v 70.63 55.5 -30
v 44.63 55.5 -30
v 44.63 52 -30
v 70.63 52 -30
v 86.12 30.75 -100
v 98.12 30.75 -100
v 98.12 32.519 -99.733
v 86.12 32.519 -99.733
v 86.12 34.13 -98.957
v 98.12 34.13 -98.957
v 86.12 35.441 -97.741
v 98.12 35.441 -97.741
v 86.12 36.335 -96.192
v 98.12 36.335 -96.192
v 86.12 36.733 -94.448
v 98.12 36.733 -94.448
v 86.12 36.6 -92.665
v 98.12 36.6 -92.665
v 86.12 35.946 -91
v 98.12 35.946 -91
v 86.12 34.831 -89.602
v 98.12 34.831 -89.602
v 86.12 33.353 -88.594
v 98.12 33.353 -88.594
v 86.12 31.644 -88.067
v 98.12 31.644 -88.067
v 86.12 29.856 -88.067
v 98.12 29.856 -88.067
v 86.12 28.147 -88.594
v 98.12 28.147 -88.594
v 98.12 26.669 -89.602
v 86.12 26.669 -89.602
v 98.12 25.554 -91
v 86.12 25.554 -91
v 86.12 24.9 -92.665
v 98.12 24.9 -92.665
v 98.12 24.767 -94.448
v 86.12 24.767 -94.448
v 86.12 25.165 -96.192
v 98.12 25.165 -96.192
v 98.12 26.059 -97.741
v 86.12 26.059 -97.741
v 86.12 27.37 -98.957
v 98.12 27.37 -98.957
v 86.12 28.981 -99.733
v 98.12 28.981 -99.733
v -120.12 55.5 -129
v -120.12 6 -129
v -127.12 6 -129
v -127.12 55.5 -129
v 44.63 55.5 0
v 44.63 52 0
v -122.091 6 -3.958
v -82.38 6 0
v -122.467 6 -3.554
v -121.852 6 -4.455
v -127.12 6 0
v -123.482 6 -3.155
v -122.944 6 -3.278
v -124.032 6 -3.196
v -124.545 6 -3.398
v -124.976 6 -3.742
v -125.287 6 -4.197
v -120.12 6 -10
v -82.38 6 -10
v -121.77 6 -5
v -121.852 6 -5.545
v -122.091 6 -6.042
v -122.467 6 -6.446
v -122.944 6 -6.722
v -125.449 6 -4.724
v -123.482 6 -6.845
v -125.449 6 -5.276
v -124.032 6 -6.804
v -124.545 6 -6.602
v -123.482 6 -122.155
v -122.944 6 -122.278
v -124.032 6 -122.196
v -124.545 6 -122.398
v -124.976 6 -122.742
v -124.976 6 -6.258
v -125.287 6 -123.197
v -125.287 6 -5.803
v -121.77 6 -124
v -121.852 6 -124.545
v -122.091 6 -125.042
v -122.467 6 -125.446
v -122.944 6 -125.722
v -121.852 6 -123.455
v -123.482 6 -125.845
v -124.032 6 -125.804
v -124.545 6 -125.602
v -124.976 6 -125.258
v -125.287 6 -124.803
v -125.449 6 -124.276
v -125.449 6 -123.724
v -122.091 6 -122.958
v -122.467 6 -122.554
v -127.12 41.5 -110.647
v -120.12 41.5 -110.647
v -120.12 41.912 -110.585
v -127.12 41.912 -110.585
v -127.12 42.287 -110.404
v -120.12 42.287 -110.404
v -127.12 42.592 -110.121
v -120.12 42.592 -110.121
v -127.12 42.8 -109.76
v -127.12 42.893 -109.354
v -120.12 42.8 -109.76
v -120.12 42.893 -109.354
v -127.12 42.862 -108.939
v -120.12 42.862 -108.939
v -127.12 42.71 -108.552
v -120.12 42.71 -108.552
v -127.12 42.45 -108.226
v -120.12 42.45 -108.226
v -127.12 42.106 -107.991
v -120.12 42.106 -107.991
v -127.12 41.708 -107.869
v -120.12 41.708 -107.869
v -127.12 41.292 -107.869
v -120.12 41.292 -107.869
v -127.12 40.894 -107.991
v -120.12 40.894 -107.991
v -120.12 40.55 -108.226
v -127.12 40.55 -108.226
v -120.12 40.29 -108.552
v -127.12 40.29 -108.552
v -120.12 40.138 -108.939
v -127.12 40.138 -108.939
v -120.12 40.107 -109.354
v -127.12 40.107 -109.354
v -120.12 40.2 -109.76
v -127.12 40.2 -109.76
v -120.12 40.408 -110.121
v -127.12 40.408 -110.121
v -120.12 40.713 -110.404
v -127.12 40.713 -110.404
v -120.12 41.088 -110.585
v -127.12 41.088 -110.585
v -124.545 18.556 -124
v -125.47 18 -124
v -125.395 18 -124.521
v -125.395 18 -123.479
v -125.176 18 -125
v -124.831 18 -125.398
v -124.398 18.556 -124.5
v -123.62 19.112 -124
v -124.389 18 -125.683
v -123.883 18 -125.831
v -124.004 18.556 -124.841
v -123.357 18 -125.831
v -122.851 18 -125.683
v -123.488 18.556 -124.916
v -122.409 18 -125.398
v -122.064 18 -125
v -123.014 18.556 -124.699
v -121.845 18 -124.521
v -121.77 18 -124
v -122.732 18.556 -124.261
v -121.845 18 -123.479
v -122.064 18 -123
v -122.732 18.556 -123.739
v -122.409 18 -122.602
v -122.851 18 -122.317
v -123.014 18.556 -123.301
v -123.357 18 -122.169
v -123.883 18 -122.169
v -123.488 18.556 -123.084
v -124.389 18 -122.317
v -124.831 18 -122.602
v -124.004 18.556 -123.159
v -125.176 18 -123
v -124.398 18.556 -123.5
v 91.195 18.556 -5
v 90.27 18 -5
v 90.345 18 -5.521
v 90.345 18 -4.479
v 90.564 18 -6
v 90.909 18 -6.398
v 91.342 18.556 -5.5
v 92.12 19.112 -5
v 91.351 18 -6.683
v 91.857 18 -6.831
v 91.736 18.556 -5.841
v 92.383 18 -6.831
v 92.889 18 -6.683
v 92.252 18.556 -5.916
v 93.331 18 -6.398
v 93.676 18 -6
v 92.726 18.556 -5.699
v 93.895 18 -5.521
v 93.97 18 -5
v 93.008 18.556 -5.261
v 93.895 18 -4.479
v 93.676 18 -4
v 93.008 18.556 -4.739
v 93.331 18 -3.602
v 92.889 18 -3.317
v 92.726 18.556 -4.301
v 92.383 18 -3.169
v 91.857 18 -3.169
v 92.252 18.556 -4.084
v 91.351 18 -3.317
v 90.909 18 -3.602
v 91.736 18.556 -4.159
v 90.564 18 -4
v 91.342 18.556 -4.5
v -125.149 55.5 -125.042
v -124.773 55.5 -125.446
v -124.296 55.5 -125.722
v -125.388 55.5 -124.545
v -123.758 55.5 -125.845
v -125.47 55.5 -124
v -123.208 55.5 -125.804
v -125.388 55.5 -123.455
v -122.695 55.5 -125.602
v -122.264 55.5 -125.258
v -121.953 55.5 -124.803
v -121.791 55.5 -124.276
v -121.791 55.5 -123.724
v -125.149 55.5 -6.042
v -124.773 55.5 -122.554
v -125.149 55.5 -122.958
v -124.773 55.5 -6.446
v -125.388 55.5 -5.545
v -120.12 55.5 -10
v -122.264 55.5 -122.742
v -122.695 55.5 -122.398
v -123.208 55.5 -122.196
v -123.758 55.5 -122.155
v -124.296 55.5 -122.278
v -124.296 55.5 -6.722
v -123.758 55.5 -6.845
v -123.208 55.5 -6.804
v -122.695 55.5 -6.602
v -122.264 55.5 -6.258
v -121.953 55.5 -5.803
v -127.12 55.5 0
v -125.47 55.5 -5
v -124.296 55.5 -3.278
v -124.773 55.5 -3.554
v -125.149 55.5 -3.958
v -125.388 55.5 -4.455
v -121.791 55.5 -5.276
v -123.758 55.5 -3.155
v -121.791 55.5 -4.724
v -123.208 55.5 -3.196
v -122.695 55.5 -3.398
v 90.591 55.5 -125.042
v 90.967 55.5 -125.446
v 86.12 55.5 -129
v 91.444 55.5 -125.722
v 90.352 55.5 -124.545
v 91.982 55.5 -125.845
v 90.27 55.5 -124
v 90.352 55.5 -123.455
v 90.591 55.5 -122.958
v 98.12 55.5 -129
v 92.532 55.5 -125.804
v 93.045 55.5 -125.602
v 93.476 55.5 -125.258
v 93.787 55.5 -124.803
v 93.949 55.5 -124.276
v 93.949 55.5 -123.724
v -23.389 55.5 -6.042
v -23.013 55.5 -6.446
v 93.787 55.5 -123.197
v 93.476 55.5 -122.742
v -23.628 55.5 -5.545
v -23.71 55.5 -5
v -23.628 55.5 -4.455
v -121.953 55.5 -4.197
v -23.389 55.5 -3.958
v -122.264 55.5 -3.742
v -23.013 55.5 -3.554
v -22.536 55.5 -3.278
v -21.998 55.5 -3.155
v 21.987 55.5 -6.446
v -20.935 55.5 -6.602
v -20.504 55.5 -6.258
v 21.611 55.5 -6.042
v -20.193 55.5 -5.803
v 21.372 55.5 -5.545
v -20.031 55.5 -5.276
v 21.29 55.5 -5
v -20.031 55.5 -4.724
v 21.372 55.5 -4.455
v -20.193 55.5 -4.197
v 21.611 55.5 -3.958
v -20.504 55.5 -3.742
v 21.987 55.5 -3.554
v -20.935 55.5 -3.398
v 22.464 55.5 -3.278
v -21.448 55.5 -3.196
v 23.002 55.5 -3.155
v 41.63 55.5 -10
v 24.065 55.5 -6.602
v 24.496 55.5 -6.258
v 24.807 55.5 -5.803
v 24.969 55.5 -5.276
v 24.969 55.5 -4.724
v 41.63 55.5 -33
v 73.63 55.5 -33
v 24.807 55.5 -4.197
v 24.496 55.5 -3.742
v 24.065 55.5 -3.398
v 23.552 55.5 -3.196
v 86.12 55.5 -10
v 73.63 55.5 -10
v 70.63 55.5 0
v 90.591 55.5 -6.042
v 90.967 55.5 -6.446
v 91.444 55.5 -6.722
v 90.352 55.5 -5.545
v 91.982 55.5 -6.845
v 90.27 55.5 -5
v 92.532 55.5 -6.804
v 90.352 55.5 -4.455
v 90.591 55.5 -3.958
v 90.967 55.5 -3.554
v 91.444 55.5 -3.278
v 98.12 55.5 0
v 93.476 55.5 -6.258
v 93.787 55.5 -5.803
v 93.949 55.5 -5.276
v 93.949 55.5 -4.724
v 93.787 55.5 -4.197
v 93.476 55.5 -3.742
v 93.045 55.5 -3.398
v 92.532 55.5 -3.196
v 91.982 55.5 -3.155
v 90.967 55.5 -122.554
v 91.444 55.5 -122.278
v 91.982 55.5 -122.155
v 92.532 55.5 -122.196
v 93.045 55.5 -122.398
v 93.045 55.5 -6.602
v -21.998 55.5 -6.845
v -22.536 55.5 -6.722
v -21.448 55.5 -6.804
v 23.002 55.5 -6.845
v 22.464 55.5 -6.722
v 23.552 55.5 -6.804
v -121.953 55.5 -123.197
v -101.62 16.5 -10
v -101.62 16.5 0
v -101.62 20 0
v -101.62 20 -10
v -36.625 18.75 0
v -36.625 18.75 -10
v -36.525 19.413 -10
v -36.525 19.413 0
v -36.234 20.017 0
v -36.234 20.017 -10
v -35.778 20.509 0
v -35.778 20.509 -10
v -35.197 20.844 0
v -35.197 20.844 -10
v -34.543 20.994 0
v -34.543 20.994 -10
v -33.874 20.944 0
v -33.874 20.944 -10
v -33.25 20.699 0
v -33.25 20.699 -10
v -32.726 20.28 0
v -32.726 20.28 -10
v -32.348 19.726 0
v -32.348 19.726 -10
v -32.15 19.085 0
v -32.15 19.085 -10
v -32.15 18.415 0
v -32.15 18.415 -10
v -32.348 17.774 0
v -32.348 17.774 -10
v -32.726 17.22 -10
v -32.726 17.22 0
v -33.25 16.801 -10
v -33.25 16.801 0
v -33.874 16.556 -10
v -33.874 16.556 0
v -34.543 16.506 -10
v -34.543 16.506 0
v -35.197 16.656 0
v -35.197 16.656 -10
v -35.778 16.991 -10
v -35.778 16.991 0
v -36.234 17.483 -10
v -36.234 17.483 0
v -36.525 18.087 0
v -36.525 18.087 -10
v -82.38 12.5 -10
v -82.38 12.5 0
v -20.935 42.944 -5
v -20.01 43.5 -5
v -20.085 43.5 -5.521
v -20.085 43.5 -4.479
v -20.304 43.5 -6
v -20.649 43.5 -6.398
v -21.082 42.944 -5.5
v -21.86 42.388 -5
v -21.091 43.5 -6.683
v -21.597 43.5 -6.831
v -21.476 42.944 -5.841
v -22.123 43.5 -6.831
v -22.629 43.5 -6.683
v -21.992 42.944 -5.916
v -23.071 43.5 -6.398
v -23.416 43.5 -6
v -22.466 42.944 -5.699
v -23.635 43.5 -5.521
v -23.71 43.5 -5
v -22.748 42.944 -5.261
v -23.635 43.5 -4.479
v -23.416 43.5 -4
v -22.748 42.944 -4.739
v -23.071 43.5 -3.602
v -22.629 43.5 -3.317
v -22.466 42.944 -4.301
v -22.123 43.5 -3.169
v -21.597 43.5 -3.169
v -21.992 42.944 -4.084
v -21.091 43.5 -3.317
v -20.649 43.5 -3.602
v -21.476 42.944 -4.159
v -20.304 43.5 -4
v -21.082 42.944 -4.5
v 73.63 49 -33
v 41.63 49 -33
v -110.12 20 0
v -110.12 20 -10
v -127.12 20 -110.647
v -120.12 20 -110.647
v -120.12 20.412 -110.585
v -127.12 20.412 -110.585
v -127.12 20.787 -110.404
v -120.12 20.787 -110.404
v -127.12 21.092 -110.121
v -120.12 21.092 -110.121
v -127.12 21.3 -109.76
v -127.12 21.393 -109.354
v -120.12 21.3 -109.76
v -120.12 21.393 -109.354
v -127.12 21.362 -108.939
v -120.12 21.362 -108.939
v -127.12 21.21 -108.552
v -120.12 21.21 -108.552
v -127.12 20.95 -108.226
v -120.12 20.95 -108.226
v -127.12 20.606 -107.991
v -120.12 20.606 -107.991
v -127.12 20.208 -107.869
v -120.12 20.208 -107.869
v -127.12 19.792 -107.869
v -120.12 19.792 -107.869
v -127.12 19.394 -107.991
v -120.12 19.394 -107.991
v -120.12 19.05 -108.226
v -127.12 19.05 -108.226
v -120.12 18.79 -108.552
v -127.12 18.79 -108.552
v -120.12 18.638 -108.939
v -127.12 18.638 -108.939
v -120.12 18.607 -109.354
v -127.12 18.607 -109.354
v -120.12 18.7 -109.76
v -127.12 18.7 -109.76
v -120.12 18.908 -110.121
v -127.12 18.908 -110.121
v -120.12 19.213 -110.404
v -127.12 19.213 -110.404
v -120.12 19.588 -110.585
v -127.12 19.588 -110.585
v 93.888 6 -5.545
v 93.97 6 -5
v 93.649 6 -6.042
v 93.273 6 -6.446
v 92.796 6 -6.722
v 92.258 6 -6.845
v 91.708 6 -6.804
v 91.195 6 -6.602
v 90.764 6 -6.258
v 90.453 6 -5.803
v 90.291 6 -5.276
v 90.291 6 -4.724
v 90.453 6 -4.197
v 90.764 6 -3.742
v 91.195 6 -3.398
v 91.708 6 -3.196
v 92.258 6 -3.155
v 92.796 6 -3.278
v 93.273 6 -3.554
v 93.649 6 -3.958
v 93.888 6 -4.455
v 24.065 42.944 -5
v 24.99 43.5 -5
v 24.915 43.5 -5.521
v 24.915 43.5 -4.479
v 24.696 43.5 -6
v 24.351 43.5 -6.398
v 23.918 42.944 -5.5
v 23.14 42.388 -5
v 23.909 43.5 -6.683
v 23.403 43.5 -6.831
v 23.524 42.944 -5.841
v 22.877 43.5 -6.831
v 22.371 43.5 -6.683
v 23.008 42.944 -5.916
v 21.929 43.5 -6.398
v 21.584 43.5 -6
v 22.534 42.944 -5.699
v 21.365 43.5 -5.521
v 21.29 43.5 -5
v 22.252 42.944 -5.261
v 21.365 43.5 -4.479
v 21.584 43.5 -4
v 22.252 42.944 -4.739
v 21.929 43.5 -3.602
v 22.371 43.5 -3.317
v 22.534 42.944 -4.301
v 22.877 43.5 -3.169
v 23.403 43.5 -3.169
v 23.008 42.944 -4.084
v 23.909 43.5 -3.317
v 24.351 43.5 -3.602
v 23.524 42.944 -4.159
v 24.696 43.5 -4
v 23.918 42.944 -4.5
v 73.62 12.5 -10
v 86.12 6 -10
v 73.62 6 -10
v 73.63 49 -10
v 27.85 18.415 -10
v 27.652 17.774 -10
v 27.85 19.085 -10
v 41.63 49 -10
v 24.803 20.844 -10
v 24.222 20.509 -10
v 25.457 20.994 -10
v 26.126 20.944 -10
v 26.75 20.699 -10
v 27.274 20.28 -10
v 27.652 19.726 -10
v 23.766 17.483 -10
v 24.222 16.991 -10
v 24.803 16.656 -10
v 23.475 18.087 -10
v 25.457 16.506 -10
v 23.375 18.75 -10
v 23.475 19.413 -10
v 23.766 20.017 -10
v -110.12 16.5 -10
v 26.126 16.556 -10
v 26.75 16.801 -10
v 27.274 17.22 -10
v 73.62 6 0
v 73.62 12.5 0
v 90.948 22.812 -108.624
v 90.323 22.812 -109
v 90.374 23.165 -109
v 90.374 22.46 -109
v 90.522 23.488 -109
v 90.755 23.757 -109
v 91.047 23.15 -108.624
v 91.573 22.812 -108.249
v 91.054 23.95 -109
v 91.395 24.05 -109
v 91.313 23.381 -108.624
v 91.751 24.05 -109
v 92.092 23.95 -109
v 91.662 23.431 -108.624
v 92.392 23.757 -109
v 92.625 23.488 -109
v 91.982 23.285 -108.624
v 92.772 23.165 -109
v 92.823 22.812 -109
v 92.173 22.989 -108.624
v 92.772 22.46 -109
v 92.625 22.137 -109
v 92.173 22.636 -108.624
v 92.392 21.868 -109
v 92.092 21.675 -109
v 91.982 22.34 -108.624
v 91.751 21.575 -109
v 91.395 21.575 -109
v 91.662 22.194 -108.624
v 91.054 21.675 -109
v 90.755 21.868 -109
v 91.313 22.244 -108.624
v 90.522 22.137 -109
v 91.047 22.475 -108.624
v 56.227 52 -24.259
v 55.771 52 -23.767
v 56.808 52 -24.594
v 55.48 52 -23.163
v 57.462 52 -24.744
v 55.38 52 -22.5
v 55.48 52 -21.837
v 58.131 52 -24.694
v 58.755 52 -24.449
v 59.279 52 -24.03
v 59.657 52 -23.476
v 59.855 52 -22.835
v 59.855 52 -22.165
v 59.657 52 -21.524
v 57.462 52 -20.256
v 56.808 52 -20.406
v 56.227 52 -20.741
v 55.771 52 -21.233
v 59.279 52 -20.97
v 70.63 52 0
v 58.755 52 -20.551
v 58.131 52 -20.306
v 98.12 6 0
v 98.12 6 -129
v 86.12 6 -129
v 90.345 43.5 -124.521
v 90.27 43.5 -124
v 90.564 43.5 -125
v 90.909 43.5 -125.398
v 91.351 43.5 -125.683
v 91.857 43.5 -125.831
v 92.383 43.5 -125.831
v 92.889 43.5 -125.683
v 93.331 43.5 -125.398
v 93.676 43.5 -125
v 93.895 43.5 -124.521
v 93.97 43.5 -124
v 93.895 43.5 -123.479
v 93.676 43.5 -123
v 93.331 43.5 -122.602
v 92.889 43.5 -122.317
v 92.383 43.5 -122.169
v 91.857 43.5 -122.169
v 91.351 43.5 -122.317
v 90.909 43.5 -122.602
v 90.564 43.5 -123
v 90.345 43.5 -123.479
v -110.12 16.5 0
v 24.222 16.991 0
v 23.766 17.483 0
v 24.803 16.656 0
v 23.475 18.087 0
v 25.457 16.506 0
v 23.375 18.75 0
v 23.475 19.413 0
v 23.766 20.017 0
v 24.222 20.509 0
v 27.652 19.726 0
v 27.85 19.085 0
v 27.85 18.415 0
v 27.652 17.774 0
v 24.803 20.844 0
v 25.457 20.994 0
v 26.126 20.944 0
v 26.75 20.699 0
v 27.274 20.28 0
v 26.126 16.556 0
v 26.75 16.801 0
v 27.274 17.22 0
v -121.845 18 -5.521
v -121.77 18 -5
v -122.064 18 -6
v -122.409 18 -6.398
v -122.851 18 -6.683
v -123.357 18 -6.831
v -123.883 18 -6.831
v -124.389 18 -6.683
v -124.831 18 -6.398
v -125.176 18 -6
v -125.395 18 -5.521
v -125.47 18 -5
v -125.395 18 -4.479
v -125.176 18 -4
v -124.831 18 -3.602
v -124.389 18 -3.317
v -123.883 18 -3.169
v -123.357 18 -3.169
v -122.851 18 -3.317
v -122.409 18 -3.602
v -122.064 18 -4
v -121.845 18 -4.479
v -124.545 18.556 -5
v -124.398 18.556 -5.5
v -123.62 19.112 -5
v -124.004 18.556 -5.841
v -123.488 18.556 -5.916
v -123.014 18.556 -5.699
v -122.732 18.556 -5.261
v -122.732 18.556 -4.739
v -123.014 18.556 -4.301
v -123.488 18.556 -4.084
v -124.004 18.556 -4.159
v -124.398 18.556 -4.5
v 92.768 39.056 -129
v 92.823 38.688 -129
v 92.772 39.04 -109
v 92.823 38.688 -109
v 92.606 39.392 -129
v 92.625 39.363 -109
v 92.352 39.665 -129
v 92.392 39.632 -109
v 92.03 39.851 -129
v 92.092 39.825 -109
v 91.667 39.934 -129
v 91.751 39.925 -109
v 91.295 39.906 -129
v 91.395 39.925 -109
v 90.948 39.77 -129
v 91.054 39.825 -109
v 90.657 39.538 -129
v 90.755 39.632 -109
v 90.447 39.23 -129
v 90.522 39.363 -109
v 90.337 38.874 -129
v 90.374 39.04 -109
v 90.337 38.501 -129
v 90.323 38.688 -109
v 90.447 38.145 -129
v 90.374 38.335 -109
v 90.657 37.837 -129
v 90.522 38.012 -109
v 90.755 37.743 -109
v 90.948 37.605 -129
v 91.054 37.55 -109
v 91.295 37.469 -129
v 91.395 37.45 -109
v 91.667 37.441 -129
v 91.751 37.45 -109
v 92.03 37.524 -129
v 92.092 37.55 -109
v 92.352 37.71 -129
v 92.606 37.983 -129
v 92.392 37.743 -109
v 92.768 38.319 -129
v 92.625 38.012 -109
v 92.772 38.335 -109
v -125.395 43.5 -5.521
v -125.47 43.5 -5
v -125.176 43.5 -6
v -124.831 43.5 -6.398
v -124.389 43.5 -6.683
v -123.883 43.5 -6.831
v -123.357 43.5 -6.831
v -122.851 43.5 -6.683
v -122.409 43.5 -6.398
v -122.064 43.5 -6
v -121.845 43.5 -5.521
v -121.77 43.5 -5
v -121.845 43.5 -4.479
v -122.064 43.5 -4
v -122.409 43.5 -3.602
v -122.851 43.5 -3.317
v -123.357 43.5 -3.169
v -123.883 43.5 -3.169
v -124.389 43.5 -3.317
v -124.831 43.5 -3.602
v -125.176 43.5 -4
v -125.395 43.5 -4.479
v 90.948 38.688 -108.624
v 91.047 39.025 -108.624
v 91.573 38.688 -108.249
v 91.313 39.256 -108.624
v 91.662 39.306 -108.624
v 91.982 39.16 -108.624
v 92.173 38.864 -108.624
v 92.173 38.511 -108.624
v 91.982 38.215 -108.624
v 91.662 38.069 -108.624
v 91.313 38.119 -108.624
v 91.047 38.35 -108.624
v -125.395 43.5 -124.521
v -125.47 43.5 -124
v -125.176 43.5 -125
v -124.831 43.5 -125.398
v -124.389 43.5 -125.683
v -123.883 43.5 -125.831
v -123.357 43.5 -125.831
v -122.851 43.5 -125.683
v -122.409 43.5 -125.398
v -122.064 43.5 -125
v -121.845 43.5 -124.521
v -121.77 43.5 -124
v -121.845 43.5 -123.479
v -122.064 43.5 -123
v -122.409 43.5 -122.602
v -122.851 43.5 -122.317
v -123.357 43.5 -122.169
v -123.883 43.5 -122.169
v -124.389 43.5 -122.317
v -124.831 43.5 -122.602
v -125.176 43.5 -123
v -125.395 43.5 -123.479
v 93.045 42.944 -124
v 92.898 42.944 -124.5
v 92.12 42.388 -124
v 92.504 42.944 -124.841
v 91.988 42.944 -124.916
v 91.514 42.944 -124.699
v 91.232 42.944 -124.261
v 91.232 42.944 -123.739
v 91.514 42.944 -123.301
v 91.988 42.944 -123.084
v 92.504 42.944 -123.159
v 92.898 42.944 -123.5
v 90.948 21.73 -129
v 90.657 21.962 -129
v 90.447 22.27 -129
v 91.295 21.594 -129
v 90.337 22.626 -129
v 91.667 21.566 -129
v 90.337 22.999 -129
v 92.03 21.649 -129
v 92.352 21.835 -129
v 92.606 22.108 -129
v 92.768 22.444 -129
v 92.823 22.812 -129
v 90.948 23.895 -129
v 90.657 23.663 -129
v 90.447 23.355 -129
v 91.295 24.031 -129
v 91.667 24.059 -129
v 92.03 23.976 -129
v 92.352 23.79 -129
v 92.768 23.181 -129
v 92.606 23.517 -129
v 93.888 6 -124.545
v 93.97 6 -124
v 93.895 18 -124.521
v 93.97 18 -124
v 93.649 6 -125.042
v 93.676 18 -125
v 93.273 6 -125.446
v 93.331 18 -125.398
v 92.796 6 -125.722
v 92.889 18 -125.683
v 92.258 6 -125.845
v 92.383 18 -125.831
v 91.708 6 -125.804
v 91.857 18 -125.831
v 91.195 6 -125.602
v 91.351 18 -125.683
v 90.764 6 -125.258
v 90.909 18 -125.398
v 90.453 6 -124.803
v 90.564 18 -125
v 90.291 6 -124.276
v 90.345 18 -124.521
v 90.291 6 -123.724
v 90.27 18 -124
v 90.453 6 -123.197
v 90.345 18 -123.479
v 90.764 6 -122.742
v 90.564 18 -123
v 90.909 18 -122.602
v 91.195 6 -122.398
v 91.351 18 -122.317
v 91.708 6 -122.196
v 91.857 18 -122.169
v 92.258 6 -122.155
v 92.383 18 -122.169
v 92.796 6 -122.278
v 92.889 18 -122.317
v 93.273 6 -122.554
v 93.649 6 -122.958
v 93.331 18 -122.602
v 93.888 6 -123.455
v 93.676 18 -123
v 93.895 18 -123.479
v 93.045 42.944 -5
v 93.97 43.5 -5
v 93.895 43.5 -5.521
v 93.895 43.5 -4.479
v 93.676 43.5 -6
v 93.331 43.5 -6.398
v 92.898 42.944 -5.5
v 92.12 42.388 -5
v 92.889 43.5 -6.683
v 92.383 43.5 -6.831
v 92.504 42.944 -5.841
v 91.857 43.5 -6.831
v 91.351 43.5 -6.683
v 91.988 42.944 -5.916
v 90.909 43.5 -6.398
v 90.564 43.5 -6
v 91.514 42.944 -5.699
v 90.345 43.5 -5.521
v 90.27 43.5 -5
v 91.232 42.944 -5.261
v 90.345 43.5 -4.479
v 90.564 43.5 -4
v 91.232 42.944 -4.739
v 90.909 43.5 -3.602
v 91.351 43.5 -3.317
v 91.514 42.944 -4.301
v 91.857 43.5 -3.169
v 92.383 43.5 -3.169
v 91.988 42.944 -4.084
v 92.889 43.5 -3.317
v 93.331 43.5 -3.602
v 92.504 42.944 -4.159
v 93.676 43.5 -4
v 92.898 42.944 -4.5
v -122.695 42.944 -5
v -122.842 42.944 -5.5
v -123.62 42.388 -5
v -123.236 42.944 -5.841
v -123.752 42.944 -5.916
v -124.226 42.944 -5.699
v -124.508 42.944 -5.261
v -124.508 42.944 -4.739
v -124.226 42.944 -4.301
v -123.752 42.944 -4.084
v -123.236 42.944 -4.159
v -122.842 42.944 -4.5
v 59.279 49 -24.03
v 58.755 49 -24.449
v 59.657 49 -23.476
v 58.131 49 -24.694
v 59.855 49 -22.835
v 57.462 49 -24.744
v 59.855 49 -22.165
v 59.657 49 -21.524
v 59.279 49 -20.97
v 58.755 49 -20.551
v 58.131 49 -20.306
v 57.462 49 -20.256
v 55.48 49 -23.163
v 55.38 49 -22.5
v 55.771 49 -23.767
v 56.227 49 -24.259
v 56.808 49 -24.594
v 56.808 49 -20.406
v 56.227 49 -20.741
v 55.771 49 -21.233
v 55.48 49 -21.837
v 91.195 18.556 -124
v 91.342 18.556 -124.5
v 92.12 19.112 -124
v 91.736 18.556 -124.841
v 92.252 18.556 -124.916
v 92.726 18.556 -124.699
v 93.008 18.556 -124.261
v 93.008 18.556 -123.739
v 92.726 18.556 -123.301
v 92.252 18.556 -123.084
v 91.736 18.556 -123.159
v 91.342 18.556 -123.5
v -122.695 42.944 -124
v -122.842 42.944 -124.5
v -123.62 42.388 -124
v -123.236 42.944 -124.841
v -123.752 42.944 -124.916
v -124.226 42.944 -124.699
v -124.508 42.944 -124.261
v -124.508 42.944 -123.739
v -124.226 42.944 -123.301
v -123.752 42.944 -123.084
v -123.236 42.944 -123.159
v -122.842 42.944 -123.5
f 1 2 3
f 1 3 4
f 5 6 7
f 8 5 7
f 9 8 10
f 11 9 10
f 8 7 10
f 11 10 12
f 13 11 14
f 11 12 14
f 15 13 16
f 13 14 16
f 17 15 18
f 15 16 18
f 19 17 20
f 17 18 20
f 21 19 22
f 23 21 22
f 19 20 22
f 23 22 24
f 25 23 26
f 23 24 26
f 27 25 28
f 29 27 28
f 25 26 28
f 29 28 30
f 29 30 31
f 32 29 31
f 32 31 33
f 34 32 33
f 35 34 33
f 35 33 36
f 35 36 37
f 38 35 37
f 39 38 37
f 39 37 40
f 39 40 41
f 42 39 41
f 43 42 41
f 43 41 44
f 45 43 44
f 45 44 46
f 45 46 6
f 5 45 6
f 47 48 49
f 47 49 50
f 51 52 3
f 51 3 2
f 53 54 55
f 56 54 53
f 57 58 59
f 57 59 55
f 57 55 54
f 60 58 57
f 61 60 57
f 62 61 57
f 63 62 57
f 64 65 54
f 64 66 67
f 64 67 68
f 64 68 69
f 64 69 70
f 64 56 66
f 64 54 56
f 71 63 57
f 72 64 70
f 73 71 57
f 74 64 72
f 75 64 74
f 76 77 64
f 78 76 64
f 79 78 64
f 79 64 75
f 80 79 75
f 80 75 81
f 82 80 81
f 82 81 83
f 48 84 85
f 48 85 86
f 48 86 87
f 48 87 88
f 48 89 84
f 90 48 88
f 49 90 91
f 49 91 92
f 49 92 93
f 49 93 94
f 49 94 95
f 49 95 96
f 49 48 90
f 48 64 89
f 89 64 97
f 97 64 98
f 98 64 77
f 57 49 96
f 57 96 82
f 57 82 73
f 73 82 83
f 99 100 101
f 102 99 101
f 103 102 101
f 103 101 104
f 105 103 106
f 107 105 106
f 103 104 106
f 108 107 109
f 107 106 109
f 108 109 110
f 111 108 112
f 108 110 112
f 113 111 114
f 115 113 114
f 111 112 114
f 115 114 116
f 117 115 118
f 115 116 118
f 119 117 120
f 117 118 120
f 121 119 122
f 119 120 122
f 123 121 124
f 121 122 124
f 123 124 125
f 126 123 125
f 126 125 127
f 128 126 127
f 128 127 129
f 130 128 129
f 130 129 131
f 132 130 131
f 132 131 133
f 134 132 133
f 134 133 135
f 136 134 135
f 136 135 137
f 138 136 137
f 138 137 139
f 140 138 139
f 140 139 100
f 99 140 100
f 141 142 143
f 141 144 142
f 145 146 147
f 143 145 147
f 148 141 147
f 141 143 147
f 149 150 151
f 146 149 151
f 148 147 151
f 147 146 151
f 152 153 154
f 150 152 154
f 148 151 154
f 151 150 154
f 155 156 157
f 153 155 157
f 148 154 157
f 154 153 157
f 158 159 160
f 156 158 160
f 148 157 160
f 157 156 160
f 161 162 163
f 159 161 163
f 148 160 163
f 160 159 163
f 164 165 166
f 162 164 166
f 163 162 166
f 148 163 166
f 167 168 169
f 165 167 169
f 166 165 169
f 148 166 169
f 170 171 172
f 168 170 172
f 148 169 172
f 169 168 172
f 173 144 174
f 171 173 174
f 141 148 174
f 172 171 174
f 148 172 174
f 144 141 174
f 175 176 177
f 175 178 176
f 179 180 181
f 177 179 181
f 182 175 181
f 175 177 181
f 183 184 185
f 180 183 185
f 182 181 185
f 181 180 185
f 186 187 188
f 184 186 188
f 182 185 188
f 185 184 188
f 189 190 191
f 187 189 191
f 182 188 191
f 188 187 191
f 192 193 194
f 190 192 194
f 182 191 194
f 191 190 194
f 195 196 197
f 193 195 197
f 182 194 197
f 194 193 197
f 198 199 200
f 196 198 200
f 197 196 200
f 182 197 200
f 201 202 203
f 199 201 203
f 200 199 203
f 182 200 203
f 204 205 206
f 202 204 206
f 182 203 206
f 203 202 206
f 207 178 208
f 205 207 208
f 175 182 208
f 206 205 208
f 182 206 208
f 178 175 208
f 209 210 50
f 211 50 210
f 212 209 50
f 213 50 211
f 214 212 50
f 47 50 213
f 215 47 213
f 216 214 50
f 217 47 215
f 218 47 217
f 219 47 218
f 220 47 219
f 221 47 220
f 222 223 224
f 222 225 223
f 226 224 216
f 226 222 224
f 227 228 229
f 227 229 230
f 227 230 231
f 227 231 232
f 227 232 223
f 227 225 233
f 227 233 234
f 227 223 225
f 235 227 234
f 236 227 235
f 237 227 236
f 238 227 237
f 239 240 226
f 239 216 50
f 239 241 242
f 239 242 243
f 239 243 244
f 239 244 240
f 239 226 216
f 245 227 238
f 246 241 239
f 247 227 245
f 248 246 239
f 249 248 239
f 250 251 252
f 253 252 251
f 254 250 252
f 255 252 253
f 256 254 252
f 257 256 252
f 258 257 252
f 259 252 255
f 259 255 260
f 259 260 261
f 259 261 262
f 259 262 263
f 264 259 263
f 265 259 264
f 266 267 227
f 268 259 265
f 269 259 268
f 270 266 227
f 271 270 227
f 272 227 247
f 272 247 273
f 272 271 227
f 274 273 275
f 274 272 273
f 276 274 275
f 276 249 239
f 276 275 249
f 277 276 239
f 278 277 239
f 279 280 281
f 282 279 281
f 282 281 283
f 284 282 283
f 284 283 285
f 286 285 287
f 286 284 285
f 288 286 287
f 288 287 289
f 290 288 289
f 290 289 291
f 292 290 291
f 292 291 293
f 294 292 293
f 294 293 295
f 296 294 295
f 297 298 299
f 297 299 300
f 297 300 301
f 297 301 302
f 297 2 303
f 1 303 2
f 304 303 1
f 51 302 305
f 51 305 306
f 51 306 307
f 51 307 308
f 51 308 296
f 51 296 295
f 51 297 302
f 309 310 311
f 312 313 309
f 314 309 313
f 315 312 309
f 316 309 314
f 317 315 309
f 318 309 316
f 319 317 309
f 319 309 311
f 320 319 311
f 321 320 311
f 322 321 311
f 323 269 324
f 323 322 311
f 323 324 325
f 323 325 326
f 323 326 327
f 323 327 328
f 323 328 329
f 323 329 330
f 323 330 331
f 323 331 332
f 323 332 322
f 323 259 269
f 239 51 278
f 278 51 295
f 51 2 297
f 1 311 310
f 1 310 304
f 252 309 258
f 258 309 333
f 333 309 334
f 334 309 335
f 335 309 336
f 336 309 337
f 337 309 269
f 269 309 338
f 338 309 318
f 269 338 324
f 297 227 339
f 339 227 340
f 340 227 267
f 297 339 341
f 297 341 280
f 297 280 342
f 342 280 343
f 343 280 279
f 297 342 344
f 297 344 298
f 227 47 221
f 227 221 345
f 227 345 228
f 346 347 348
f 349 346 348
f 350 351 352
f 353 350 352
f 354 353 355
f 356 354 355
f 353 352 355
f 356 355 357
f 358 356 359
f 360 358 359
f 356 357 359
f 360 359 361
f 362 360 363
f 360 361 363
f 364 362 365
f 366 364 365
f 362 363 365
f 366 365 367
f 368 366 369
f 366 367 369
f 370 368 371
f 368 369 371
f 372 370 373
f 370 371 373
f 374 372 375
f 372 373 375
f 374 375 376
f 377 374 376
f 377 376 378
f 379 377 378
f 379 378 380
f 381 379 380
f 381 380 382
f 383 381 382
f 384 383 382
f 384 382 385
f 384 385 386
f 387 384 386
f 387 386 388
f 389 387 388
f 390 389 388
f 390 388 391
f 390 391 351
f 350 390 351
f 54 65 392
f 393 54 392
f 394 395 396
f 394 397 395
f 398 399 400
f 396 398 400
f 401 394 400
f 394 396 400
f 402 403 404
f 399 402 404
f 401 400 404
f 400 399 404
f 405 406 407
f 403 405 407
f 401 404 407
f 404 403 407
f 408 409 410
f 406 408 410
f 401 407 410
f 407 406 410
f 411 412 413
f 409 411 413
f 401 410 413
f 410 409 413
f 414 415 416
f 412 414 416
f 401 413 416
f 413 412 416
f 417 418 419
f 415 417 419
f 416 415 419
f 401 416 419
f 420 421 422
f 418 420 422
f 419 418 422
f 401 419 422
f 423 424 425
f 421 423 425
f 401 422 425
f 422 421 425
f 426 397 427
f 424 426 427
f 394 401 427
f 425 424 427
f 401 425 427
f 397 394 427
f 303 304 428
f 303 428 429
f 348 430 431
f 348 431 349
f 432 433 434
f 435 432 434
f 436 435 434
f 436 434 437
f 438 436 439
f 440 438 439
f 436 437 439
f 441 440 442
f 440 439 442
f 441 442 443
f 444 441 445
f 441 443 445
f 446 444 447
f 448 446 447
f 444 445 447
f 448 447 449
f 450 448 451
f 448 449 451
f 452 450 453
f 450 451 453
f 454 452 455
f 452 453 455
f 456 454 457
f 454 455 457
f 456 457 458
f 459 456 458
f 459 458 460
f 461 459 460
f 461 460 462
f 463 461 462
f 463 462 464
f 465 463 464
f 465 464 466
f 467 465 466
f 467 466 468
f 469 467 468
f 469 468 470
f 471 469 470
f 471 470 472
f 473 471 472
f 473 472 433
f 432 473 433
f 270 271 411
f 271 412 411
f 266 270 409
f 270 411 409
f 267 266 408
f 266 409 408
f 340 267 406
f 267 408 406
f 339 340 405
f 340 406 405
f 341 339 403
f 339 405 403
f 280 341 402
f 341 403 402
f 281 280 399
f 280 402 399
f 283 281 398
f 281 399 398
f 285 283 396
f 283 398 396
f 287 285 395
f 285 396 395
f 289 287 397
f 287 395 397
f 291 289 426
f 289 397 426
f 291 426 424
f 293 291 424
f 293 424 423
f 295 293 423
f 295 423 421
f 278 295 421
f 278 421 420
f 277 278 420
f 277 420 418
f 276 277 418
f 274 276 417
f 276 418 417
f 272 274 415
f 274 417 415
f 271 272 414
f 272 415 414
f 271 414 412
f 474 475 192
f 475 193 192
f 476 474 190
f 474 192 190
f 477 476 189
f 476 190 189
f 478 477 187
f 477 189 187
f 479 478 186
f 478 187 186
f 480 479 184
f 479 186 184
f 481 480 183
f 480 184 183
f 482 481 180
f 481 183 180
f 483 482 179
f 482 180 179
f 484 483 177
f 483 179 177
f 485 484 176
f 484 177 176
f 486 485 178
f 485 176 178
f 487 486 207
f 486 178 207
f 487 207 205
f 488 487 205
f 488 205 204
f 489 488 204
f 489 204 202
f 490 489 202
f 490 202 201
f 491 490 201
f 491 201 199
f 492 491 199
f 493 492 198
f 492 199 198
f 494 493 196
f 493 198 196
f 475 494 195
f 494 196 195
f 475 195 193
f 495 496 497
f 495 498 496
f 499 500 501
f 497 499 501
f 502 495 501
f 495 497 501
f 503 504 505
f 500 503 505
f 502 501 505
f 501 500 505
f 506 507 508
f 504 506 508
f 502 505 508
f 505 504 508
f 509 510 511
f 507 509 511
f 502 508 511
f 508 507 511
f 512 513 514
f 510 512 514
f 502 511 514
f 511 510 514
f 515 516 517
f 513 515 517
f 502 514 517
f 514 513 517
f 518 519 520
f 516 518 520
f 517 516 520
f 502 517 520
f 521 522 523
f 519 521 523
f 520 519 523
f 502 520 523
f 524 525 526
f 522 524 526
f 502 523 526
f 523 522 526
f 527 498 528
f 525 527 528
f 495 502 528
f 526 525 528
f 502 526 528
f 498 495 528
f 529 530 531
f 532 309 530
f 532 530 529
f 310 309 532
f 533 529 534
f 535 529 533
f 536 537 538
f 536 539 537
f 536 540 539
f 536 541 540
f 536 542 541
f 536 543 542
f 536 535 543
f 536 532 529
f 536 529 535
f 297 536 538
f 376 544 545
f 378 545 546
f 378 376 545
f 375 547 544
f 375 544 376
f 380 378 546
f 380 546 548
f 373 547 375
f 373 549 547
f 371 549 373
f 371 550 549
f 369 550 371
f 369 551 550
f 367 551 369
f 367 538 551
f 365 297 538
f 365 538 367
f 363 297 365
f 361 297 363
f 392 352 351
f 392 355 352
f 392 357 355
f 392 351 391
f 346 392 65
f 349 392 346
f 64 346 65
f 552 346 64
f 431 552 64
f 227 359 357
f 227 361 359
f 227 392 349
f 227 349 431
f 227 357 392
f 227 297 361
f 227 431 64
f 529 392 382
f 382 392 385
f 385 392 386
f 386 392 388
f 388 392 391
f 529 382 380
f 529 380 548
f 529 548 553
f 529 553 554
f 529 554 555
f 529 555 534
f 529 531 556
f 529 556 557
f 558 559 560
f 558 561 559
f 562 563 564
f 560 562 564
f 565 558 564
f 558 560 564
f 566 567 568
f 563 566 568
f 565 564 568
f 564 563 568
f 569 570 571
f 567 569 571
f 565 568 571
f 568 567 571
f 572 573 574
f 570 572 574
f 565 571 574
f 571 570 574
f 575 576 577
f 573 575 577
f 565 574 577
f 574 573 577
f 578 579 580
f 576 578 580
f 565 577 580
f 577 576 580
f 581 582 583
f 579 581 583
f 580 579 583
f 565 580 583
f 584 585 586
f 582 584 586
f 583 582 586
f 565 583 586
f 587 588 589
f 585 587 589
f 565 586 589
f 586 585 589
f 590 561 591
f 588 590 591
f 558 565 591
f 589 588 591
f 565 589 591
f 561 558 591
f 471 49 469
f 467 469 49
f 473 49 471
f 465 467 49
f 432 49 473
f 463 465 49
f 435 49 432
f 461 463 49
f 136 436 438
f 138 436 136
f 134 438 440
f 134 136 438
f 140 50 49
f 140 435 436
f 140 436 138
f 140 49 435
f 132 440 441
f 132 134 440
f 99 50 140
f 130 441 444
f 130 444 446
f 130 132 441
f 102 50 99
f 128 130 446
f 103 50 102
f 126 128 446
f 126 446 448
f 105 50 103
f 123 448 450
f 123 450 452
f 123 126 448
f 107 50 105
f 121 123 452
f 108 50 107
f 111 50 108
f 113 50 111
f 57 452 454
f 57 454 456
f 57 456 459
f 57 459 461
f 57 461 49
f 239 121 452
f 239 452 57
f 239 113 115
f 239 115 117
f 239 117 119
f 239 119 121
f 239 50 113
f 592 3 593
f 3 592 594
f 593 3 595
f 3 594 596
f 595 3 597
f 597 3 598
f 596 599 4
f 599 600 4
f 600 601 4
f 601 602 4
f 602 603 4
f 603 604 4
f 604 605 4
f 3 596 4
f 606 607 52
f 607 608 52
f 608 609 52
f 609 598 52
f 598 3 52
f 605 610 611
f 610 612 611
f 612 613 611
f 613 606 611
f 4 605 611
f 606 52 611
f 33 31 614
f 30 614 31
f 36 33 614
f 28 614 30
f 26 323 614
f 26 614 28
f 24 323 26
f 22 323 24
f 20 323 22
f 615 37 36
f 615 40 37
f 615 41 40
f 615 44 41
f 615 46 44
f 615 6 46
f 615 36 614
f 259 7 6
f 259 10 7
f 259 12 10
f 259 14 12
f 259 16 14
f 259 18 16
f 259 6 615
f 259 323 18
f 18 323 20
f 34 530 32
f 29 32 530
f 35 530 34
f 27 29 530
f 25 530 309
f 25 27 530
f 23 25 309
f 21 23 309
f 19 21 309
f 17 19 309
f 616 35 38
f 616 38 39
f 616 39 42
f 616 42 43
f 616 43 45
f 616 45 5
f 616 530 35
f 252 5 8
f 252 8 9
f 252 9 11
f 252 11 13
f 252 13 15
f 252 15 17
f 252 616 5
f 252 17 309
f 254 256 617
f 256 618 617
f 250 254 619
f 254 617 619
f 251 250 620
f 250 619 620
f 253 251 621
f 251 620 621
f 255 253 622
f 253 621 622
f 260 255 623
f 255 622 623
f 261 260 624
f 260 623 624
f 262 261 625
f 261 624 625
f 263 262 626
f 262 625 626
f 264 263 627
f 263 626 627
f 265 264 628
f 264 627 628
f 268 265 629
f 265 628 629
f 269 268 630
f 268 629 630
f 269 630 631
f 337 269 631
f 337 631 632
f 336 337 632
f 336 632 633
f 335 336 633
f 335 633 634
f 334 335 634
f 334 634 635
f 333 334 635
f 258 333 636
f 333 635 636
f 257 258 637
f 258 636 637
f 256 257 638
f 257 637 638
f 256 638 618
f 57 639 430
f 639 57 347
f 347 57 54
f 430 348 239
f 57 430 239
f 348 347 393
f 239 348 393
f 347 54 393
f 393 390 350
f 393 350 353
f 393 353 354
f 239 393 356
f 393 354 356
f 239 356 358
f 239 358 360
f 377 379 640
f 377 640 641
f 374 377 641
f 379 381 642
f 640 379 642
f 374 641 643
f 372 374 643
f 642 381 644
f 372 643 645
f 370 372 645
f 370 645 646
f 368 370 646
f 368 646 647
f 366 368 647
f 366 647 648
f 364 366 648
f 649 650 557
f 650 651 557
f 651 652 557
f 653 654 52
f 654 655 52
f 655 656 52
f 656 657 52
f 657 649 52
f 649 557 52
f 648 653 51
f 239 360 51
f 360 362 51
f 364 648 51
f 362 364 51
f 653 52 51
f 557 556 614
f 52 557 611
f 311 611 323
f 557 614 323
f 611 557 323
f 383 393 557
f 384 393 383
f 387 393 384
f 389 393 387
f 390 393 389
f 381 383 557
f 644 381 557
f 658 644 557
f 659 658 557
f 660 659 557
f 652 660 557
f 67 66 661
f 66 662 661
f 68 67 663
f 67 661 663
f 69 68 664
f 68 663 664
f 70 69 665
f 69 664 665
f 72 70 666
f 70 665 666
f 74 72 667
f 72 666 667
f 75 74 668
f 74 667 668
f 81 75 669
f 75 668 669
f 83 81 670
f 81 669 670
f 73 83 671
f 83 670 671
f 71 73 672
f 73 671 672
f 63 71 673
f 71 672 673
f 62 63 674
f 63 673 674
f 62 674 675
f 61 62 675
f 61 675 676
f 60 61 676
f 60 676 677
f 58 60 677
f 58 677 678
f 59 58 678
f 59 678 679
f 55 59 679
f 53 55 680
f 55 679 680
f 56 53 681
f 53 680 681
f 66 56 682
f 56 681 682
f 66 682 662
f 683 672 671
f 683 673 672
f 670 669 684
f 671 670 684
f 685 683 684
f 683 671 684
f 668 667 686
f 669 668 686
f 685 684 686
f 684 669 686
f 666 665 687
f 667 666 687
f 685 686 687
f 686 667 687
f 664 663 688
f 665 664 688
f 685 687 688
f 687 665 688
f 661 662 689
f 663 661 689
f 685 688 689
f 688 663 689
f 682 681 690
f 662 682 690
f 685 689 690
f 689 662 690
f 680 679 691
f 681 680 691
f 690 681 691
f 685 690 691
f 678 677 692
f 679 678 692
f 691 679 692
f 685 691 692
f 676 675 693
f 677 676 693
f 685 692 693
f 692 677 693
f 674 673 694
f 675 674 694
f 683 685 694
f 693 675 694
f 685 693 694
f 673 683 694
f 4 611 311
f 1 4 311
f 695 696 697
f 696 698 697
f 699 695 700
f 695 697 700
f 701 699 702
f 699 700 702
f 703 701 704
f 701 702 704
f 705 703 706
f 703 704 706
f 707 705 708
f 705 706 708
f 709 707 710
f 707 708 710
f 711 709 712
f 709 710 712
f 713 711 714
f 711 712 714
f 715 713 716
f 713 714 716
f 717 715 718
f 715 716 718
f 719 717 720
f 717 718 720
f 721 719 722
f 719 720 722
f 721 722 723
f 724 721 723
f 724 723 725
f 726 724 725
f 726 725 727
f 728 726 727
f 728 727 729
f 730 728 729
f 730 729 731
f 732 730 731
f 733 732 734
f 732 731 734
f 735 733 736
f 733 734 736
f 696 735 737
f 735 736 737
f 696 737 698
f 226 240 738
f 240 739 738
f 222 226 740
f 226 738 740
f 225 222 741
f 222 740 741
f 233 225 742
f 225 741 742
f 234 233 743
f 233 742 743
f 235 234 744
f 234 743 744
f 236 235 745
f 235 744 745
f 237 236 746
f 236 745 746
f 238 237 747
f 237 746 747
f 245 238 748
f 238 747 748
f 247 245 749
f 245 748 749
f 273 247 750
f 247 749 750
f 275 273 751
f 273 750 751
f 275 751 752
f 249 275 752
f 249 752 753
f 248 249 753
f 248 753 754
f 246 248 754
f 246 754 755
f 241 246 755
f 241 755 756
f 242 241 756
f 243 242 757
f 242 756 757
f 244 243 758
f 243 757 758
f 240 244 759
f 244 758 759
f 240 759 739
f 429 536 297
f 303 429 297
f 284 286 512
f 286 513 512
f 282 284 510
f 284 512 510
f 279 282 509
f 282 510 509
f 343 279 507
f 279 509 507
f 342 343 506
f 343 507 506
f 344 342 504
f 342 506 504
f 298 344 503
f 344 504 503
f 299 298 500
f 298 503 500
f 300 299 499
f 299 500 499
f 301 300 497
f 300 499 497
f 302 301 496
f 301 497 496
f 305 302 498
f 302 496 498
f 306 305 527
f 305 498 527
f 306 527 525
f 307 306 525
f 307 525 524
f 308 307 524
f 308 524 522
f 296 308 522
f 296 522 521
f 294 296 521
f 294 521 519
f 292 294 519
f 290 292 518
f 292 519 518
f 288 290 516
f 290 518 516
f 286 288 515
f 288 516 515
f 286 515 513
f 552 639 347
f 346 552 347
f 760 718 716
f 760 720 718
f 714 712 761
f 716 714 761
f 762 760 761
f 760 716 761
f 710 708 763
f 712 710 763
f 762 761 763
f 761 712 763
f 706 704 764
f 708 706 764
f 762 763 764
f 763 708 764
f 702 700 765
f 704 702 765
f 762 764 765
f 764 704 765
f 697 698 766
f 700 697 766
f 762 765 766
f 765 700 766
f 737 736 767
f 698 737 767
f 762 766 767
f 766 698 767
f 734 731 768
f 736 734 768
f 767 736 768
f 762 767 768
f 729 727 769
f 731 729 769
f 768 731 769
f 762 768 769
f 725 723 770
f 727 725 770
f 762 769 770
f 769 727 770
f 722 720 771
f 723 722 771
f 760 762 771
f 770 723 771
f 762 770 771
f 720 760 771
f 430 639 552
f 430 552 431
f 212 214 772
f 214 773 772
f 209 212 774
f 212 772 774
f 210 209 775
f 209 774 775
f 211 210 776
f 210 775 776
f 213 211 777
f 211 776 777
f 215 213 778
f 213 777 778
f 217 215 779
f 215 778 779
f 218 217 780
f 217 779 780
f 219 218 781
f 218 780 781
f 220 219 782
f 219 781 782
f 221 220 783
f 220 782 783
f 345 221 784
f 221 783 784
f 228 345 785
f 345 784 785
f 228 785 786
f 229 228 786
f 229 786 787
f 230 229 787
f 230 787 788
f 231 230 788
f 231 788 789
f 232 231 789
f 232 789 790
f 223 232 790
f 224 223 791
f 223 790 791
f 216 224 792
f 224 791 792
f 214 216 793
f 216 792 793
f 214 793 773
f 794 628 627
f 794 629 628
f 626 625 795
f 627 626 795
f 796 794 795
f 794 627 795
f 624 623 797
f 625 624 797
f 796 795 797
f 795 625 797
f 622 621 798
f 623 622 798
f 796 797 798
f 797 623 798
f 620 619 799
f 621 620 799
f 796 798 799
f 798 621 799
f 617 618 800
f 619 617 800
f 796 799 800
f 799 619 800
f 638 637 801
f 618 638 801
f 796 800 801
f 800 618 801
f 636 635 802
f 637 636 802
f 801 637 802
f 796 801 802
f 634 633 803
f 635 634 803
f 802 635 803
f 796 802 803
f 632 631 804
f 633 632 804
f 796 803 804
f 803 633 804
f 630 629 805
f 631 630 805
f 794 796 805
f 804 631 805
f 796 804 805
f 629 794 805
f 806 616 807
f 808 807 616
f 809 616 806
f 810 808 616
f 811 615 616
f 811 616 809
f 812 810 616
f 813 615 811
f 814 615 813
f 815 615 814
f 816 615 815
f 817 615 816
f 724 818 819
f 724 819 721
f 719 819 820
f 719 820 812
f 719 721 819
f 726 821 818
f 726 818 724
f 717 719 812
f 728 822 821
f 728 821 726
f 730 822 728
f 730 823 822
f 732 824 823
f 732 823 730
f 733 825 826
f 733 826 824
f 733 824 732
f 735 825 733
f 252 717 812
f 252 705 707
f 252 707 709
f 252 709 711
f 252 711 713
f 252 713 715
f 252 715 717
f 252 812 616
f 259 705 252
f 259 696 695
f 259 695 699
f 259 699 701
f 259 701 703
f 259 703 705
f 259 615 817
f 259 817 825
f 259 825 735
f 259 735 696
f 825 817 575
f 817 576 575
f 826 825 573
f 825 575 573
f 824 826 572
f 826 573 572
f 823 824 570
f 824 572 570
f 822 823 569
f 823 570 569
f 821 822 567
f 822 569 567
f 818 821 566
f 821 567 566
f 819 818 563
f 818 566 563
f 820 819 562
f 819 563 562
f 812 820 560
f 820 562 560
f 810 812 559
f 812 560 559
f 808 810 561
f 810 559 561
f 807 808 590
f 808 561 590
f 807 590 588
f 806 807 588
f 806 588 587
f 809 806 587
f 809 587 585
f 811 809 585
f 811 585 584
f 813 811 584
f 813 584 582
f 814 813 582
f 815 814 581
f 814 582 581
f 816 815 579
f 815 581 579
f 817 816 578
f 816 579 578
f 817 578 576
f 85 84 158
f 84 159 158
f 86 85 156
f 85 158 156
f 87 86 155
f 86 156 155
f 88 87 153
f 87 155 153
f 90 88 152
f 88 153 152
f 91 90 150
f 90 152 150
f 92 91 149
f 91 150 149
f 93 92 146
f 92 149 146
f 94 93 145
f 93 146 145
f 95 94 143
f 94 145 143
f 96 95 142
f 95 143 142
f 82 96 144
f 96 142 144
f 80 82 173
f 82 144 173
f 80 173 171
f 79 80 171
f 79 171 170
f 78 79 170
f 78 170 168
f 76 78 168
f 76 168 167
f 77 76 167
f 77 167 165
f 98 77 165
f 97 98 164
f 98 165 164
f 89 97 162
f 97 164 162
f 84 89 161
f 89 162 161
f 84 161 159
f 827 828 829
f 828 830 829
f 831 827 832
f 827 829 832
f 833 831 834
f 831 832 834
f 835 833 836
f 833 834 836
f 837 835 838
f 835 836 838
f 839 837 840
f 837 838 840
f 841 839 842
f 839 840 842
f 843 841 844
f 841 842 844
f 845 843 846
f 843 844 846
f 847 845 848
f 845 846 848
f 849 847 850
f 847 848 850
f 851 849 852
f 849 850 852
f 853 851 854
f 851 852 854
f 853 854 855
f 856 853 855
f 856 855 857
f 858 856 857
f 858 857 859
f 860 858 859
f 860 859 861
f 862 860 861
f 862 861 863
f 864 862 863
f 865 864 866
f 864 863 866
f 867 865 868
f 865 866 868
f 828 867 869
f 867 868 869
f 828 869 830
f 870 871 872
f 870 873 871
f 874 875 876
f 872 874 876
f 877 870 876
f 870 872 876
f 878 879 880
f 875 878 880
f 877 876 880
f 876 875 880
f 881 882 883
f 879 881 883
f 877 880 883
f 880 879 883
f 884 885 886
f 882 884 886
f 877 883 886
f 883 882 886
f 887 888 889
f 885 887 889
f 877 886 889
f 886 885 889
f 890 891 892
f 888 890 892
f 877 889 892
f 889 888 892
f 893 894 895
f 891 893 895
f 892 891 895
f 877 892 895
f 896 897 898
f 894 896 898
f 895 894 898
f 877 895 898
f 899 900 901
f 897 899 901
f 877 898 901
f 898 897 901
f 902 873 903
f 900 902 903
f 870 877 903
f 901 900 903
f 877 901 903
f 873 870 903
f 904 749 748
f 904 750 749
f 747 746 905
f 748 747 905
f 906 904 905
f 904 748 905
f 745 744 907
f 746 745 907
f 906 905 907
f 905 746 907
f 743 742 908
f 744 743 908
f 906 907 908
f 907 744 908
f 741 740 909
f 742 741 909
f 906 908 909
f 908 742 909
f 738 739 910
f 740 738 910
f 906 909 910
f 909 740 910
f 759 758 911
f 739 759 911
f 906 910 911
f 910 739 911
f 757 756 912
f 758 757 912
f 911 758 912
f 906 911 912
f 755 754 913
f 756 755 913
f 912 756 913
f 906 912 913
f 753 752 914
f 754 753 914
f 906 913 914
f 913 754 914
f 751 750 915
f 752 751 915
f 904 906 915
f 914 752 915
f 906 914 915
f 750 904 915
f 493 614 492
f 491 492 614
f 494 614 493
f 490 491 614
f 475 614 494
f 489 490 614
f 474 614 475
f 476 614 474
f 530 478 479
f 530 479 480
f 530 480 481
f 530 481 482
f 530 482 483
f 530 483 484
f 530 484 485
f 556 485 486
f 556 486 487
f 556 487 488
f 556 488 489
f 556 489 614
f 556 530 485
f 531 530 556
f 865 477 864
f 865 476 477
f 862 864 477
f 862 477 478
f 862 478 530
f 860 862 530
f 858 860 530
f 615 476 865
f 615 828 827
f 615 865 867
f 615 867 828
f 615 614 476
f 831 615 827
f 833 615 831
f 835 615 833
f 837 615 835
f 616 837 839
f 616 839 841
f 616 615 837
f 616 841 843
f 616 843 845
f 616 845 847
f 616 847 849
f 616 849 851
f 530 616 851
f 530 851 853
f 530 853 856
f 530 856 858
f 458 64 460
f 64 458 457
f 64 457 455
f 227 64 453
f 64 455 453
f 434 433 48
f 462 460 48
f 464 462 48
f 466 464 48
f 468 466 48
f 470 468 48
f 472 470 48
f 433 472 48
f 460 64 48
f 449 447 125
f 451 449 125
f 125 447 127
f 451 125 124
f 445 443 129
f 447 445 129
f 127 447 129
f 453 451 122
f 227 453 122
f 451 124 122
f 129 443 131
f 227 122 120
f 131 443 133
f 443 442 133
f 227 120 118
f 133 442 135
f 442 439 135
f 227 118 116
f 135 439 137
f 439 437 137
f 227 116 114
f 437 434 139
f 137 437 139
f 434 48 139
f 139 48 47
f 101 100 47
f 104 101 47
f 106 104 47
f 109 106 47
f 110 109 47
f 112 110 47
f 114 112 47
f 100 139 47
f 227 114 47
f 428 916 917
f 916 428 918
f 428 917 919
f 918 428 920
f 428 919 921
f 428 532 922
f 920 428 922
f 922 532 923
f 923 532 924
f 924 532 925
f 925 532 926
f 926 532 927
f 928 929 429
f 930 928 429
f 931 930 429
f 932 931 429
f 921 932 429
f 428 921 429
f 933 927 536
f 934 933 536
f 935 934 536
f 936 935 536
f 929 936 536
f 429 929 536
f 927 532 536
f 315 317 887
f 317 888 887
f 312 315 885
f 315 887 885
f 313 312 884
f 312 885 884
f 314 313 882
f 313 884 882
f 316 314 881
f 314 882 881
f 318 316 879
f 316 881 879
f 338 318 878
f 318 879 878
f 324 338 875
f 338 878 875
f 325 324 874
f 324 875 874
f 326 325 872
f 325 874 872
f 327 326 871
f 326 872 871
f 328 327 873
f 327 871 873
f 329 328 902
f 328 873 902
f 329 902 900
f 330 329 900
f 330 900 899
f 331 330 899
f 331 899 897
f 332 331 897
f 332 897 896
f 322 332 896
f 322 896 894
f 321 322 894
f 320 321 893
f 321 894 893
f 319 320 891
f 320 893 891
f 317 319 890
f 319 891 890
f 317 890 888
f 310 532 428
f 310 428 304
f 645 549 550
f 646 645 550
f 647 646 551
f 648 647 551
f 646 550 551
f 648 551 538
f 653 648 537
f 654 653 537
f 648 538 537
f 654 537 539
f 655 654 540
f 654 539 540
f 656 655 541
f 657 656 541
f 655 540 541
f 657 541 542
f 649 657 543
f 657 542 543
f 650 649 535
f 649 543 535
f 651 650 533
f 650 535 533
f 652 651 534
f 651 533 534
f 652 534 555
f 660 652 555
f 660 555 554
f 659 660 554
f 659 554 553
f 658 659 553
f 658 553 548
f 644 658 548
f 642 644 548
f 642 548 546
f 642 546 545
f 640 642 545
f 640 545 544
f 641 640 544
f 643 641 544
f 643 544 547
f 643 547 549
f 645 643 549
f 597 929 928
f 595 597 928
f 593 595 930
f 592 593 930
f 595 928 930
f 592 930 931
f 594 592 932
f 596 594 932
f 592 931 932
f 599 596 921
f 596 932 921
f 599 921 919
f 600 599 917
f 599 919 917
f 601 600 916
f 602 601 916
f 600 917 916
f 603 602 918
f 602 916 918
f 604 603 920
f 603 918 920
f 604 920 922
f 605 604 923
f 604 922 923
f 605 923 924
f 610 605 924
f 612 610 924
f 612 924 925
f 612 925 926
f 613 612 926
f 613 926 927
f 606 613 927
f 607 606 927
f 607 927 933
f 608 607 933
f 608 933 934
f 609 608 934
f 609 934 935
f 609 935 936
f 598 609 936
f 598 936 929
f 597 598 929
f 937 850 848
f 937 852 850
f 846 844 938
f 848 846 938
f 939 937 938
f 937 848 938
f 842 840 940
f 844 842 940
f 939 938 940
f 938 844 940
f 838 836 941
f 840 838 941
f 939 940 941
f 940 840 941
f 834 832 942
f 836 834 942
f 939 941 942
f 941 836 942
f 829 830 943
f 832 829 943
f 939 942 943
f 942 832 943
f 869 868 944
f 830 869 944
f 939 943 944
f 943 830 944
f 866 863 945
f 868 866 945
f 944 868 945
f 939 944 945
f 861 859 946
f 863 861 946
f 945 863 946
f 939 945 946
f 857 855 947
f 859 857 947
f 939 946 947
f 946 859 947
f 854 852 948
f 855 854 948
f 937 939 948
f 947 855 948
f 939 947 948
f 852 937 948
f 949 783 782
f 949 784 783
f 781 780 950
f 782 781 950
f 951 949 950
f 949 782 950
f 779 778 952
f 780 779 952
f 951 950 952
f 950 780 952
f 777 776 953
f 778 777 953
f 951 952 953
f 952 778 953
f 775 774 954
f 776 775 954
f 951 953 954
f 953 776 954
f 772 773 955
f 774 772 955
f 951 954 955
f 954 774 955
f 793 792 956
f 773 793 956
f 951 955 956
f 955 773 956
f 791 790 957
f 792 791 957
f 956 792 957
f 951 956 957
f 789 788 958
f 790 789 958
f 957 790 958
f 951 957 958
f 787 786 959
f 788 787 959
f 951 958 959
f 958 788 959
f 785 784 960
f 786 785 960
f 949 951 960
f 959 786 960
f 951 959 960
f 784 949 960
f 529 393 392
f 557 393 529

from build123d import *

# Parameters (mm, degrees)
SKETCH1_W                      = 129
SKETCH1_H                      = 55.5
BOSS_EXTRUDE1_DEPTH            = 98.12
SKETCH18_W                     = 129
SKETCH18_H                     = 55.5
BOSS_EXTRUDE9_DEPTH            = 29
SKETCH33_W                     = 156
SKETCH33_H                     = 12.5
CUT_EXTRUDE8_DEPTH             = 20.5
SKETCH40_W                     = 206.24
SKETCH40_H                     = 49.5
CUT_EXTRUDE9_DEPTH             = 119
CUT_EXTRUDE18_REACH            = 191.422
SKETCH62_W                     = 8.5
SKETCH62_H                     = 3.5
M4_CLEARANCE_HOLE2_D           = 4.5
F_2_0_221_DIAMETER_HOLE1_D     = 2.50000008
F_2_0_221_DIAMETER_HOLE1_DEPTH = 20
F_2_0_221_DIAMETER_HOLE1_TIP   = 0.751075798
SKETCH70_W                     = 32
SKETCH70_H                     = 6.5
BOSS_EXTRUDE10_DEPTH           = 23
SKETCH71_W                     = 26
SKETCH71_H                     = 3.5
CUT_EXTRUDE19_DEPTH            = 30
SKETCH73_W                     = 225.24
SKETCH73_H                     = 6
CUT_EXTRUDE20_DEPTH            = 190.422132815
F_3_7_3_7_DIAMETER_HOLE1_D     = 3.7
F_3_7_3_7_DIAMETER_HOLE1_DEPTH = 12
F_3_7_3_7_DIAMETER_HOLE1_TIP   = 1.111592145
F_3_7_3_7_DIAMETER_HOLE2_D     = 3.7
F_3_7_3_7_DIAMETER_HOLE2_DEPTH = 12
F_3_7_3_7_DIAMETER_HOLE2_TIP   = 1.111592145
M4_CLEARANCE_HOLE3_D           = 4.5
M4_CLEARANCE_HOLE3_DEPTH       = 12
M4_CLEARANCE_HOLE3_TIP         = 1.351936393
F_3_CLEARANCE_HOLE1_D          = 2.794
F_3_CLEARANCE_HOLE1_DEPTH      = 7
F_12_0MM_DOWEL_HOLE1_D         = 12
F_12_0MM_DOWEL_HOLE1_DEPTH     = 12


with BuildPart() as part:
    # Sketch1 → Boss-Extrude1 (new, symmetric)
    with BuildSketch(Plane(origin=(0, 0, 0), x_dir=(0, 0, -1), z_dir=(1, 0, 0))):
        with Locations((64.5, 27.75)):
            Rectangle(SKETCH1_W, SKETCH1_H)
    extrude(amount=BOSS_EXTRUDE1_DEPTH, both=True)

    # Sketch18 → Boss-Extrude9 (add)
    with BuildSketch(Plane.ZY.offset(98.12)):
        with Locations((-64.5, 27.75)):
            Rectangle(SKETCH18_W, SKETCH18_H)
    extrude(amount=BOSS_EXTRUDE9_DEPTH)

    # Sketch33 → Cut-Extrude8 (cut)
    with BuildSketch(Plane.XY):
        with Locations((-4.38, 6.25)):
            Rectangle(SKETCH33_W, SKETCH33_H)
    extrude(amount=-CUT_EXTRUDE8_DEPTH, mode=Mode.SUBTRACT)

    # Sketch40 → Cut-Extrude9 (cut)
    with BuildSketch(Plane(origin=(0, 0, -129), x_dir=(-1, 0, 0), z_dir=(0, 0, -1))):
        with Locations((17, 30.75)):
            Rectangle(SKETCH40_W, SKETCH40_H)
    extrude(amount=-CUT_EXTRUDE9_DEPTH, mode=Mode.SUBTRACT)

    # Sketch62 → Cut-Extrude18 (cut, up to next)
    with BuildSketch(Plane.XY, mode=Mode.PRIVATE) as cut_extrude18_sk1:
        with Locations((-105.87, 18.25)):
            Rectangle(SKETCH62_W, SKETCH62_H)
    cut_extrude18_tool1 = extrude(cut_extrude18_sk1.sketch, amount=-CUT_EXTRUDE18_REACH, mode=Mode.PRIVATE) & part.part
    add(cut_extrude18_tool1.solids().sort_by_distance((-105.87, 18.25, 0))[0], mode=Mode.SUBTRACT)

    # M4 Clearance Hole2 (through all)
    with Locations(Plane.XY):
        with Locations((-34.375, 18.75), (25.625, 18.75)):
            Hole(M4_CLEARANCE_HOLE2_D / 2)

    # #2 (0.221) Diameter Hole1
    with Locations(Plane(origin=(0, 0, -129), x_dir=(-1, 0, 0), z_dir=(0, 0, -1))):
        with Locations((-91.573125, 38.6875), (-91.573125, 22.8125)):
            Hole(F_2_0_221_DIAMETER_HOLE1_D / 2, depth=F_2_0_221_DIAMETER_HOLE1_DEPTH)
            with Locations((0, 0, -(F_2_0_221_DIAMETER_HOLE1_DEPTH + F_2_0_221_DIAMETER_HOLE1_TIP / 2))):  # 118° drill point
                Cone(0, F_2_0_221_DIAMETER_HOLE1_D / 2, F_2_0_221_DIAMETER_HOLE1_TIP, mode=Mode.SUBTRACT)

    # Sketch70 → Boss-Extrude10 (add)
    with BuildSketch(Plane(origin=(0, 0, -10), x_dir=(-1, 0, 0), z_dir=(0, 0, -1))):
        with Locations((-57.63, 52.25)):
            Rectangle(SKETCH70_W, SKETCH70_H)
    extrude(amount=BOSS_EXTRUDE10_DEPTH)

    # Sketch71 → Cut-Extrude19 (cut)
    with BuildSketch(Plane.XY):
        with Locations((57.63, 53.75)):
            Rectangle(SKETCH71_W, SKETCH71_H)
    extrude(amount=-CUT_EXTRUDE19_DEPTH, mode=Mode.SUBTRACT)

    # Sketch73 → Cut-Extrude20 (cut, through all)
    with BuildSketch(Plane(origin=(0, 0, -129), x_dir=(-1, 0, 0), z_dir=(0, 0, -1))):
        with Locations((14.5, 3)):
            Rectangle(SKETCH73_W, SKETCH73_H)
    extrude(amount=-CUT_EXTRUDE20_DEPTH, mode=Mode.SUBTRACT)

    # Ø3.7 (3.7) Diameter Hole1
    with Locations(Plane(origin=(0, 55.5, 0), x_dir=(1, 0, 0), z_dir=(0, 1, 0))):
        with Locations((92.12, 124), (92.12, 5), (-123.62, 124), (-123.62, 5), (23.14, 5), (-21.86, 5)):
            Hole(F_3_7_3_7_DIAMETER_HOLE1_D / 2, depth=F_3_7_3_7_DIAMETER_HOLE1_DEPTH)
            with Locations((0, 0, -(F_3_7_3_7_DIAMETER_HOLE1_DEPTH + F_3_7_3_7_DIAMETER_HOLE1_TIP / 2))):  # 118° drill point
                Cone(0, F_3_7_3_7_DIAMETER_HOLE1_D / 2, F_3_7_3_7_DIAMETER_HOLE1_TIP, mode=Mode.SUBTRACT)

    # Ø3.7 (3.7) Diameter Hole2
    with Locations(Plane(origin=(0, 6, 0), x_dir=(-1, 0, 0), z_dir=(0, -1, 0))):
        with Locations((-92.12, 124), (-92.12, 5), (123.62, 5), (123.62, 124)):
            Hole(F_3_7_3_7_DIAMETER_HOLE2_D / 2, depth=F_3_7_3_7_DIAMETER_HOLE2_DEPTH)
            with Locations((0, 0, -(F_3_7_3_7_DIAMETER_HOLE2_DEPTH + F_3_7_3_7_DIAMETER_HOLE2_TIP / 2))):  # 118° drill point
                Cone(0, F_3_7_3_7_DIAMETER_HOLE2_D / 2, F_3_7_3_7_DIAMETER_HOLE2_TIP, mode=Mode.SUBTRACT)

    # M4 Clearance Hole3
    with Locations(Plane(origin=(0, 52, 0), x_dir=(1, 0, 0), z_dir=(0, 1, 0))):
        with Locations((57.63, 22.5)):
            Hole(M4_CLEARANCE_HOLE3_D / 2, depth=M4_CLEARANCE_HOLE3_DEPTH)
            with Locations((0, 0, -(M4_CLEARANCE_HOLE3_DEPTH + M4_CLEARANCE_HOLE3_TIP / 2))):  # 118° drill point
                Cone(0, M4_CLEARANCE_HOLE3_D / 2, M4_CLEARANCE_HOLE3_TIP, mode=Mode.SUBTRACT)

    # #3 Clearance Hole1
    with Locations(Plane.ZY.offset(127.12)):
        with Locations((-109.25, 41.5), (-109.25, 20)):
            Hole(F_3_CLEARANCE_HOLE1_D / 2, depth=F_3_CLEARANCE_HOLE1_DEPTH)

    # Ø12.0mm Dowel Hole1
    with Locations(Plane.ZY.offset(-86.12)):
        with Locations((-94, 30.75)):
            Hole(F_12_0MM_DOWEL_HOLE1_D / 2, depth=F_12_0MM_DOWEL_HOLE1_DEPTH)


solid = part.part
